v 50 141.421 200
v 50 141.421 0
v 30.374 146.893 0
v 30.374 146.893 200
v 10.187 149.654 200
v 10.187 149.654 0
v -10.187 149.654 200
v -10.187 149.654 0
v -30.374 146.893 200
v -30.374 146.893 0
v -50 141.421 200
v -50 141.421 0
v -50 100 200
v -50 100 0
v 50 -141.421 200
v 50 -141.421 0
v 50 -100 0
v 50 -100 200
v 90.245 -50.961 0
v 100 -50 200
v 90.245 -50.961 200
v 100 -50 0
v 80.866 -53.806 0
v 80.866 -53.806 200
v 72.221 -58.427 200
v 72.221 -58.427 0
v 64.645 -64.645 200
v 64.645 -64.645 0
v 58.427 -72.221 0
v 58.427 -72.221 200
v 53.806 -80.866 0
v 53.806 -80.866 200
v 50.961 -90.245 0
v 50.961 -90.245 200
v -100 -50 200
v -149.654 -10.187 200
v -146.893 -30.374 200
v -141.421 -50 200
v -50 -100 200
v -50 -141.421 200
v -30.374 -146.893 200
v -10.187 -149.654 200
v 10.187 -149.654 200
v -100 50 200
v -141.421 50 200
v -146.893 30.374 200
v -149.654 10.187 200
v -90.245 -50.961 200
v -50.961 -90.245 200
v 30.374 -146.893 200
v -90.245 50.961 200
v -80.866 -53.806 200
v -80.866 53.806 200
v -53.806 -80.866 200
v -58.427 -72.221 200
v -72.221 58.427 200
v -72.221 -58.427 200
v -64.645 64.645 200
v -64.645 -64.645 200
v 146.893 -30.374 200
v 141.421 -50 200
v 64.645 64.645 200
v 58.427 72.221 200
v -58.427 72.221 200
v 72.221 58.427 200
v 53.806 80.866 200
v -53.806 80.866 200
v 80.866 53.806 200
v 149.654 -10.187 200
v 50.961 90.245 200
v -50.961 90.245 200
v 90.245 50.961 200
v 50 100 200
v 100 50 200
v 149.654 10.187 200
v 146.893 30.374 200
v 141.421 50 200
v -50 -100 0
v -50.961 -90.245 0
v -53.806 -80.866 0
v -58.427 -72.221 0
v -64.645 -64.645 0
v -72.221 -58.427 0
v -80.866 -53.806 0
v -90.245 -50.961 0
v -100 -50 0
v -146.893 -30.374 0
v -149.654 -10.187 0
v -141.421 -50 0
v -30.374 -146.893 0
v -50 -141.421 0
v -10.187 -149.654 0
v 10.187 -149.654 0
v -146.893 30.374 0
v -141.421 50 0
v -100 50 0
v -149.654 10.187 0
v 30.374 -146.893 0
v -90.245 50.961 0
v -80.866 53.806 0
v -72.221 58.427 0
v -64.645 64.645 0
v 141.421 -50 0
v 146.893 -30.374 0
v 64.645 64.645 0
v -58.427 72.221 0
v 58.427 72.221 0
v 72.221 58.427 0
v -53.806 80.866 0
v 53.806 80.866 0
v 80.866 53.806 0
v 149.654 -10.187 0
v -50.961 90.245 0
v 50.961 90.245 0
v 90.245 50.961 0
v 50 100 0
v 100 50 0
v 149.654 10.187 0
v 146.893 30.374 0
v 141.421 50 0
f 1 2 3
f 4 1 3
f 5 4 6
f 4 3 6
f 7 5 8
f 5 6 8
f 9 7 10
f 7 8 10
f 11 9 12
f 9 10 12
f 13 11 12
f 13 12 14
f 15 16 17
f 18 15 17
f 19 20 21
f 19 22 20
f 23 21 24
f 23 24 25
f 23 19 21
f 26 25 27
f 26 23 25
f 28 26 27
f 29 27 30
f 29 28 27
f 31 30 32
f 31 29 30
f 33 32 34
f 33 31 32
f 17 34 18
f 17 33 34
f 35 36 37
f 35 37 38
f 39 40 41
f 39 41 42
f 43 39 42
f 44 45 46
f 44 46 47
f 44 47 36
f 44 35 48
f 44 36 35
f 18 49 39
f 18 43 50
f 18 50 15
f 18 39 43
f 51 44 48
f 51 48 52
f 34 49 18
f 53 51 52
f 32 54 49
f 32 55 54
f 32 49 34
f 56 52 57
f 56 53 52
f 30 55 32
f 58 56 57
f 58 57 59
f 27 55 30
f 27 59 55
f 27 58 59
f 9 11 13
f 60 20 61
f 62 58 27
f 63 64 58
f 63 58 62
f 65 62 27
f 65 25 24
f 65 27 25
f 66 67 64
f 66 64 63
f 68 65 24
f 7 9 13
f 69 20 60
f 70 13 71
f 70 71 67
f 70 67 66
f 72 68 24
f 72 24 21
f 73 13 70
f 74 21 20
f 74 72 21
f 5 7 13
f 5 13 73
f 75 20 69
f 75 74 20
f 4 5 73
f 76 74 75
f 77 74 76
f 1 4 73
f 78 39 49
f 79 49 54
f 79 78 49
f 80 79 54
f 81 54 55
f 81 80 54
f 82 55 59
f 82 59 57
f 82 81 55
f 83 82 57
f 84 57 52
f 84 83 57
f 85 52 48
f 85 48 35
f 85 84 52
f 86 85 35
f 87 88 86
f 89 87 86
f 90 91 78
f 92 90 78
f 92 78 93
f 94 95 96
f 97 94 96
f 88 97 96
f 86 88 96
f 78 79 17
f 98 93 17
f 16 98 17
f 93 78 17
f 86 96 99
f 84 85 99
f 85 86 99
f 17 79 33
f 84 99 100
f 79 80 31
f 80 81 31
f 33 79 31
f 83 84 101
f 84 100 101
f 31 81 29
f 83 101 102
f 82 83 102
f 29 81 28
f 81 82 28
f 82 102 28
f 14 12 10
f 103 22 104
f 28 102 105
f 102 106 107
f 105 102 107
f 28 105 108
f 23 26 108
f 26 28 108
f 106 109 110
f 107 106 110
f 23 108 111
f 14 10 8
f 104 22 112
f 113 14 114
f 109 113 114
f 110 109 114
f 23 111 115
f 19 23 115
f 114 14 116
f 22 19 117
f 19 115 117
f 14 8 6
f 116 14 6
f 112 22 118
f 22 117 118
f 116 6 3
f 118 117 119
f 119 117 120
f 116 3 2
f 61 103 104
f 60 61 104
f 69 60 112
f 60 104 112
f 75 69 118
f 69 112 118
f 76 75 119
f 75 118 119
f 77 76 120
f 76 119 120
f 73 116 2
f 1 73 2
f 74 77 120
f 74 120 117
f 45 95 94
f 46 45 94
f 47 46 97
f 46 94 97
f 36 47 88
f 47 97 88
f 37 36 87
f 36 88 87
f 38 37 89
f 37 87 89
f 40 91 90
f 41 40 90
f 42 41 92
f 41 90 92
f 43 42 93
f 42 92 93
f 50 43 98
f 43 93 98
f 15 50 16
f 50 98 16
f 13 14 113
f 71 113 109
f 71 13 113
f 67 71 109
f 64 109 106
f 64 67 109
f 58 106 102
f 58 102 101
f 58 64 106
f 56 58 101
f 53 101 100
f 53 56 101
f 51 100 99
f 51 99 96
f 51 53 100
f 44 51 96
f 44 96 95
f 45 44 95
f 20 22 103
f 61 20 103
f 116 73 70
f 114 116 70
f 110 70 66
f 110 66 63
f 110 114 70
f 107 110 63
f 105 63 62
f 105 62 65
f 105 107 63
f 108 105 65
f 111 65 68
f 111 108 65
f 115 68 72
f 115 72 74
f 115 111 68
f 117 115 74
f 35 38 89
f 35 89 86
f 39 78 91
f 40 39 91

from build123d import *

# Parameters (mm, degrees)
BOSS_EXTRUDE1_DEPTH = 200
CIRPATTERN1_COUNT   = 4
FILLET1_R           = 50


with BuildPart() as part:
    # Sketch1 → Boss-Extrude1 (new body)
    with BuildSketch(Plane(origin=(0, 0, 0), x_dir=(0, 1, 0), z_dir=(0, 0, 1))):
        with BuildLine():
            Line((-50, 141.421356237), (-50, 0))
            Line((-50, 0), (50, 0))
            Line((50, 0), (50, 141.421356237))
            ThreePointArc((50, 141.421356237), (0, 150), (-50, 141.421356237))
        make_face()
    extrude(amount=BOSS_EXTRUDE1_DEPTH)


with BuildPart() as cirpattern1_1:
    # CirPattern1: pattern copy
    add(part.part.rotate(Axis((0, 0, -10), (0, 0, 1)), 1 * 360 / CIRPATTERN1_COUNT))


with BuildPart() as cirpattern1_2:
    # CirPattern1: pattern copy
    add(part.part.rotate(Axis((0, 0, -10), (0, 0, 1)), 2 * 360 / CIRPATTERN1_COUNT))


with BuildPart() as cirpattern1_3:
    # CirPattern1: pattern copy
    add(part.part.rotate(Axis((0, 0, -10), (0, 0, 1)), 3 * 360 / CIRPATTERN1_COUNT))


with BuildPart() as part_1:
    add(part.part)

    # Combine1: union CirPattern1_1, CirPattern1_2, CirPattern1_3
    add(cirpattern1_1.part)
    add(cirpattern1_2.part)
    add(cirpattern1_3.part)

    # Fillet1
    fillet1_edges = [part_1.edges().sort_by_distance(p)[0] for p in [
        (50, 50, 100),
        (50, -50, 100),
        (-50, 50, 100),
        (-50, -50, 100),
    ]]
    fillet(fillet1_edges, radius=FILLET1_R)


solid = part_1.part
